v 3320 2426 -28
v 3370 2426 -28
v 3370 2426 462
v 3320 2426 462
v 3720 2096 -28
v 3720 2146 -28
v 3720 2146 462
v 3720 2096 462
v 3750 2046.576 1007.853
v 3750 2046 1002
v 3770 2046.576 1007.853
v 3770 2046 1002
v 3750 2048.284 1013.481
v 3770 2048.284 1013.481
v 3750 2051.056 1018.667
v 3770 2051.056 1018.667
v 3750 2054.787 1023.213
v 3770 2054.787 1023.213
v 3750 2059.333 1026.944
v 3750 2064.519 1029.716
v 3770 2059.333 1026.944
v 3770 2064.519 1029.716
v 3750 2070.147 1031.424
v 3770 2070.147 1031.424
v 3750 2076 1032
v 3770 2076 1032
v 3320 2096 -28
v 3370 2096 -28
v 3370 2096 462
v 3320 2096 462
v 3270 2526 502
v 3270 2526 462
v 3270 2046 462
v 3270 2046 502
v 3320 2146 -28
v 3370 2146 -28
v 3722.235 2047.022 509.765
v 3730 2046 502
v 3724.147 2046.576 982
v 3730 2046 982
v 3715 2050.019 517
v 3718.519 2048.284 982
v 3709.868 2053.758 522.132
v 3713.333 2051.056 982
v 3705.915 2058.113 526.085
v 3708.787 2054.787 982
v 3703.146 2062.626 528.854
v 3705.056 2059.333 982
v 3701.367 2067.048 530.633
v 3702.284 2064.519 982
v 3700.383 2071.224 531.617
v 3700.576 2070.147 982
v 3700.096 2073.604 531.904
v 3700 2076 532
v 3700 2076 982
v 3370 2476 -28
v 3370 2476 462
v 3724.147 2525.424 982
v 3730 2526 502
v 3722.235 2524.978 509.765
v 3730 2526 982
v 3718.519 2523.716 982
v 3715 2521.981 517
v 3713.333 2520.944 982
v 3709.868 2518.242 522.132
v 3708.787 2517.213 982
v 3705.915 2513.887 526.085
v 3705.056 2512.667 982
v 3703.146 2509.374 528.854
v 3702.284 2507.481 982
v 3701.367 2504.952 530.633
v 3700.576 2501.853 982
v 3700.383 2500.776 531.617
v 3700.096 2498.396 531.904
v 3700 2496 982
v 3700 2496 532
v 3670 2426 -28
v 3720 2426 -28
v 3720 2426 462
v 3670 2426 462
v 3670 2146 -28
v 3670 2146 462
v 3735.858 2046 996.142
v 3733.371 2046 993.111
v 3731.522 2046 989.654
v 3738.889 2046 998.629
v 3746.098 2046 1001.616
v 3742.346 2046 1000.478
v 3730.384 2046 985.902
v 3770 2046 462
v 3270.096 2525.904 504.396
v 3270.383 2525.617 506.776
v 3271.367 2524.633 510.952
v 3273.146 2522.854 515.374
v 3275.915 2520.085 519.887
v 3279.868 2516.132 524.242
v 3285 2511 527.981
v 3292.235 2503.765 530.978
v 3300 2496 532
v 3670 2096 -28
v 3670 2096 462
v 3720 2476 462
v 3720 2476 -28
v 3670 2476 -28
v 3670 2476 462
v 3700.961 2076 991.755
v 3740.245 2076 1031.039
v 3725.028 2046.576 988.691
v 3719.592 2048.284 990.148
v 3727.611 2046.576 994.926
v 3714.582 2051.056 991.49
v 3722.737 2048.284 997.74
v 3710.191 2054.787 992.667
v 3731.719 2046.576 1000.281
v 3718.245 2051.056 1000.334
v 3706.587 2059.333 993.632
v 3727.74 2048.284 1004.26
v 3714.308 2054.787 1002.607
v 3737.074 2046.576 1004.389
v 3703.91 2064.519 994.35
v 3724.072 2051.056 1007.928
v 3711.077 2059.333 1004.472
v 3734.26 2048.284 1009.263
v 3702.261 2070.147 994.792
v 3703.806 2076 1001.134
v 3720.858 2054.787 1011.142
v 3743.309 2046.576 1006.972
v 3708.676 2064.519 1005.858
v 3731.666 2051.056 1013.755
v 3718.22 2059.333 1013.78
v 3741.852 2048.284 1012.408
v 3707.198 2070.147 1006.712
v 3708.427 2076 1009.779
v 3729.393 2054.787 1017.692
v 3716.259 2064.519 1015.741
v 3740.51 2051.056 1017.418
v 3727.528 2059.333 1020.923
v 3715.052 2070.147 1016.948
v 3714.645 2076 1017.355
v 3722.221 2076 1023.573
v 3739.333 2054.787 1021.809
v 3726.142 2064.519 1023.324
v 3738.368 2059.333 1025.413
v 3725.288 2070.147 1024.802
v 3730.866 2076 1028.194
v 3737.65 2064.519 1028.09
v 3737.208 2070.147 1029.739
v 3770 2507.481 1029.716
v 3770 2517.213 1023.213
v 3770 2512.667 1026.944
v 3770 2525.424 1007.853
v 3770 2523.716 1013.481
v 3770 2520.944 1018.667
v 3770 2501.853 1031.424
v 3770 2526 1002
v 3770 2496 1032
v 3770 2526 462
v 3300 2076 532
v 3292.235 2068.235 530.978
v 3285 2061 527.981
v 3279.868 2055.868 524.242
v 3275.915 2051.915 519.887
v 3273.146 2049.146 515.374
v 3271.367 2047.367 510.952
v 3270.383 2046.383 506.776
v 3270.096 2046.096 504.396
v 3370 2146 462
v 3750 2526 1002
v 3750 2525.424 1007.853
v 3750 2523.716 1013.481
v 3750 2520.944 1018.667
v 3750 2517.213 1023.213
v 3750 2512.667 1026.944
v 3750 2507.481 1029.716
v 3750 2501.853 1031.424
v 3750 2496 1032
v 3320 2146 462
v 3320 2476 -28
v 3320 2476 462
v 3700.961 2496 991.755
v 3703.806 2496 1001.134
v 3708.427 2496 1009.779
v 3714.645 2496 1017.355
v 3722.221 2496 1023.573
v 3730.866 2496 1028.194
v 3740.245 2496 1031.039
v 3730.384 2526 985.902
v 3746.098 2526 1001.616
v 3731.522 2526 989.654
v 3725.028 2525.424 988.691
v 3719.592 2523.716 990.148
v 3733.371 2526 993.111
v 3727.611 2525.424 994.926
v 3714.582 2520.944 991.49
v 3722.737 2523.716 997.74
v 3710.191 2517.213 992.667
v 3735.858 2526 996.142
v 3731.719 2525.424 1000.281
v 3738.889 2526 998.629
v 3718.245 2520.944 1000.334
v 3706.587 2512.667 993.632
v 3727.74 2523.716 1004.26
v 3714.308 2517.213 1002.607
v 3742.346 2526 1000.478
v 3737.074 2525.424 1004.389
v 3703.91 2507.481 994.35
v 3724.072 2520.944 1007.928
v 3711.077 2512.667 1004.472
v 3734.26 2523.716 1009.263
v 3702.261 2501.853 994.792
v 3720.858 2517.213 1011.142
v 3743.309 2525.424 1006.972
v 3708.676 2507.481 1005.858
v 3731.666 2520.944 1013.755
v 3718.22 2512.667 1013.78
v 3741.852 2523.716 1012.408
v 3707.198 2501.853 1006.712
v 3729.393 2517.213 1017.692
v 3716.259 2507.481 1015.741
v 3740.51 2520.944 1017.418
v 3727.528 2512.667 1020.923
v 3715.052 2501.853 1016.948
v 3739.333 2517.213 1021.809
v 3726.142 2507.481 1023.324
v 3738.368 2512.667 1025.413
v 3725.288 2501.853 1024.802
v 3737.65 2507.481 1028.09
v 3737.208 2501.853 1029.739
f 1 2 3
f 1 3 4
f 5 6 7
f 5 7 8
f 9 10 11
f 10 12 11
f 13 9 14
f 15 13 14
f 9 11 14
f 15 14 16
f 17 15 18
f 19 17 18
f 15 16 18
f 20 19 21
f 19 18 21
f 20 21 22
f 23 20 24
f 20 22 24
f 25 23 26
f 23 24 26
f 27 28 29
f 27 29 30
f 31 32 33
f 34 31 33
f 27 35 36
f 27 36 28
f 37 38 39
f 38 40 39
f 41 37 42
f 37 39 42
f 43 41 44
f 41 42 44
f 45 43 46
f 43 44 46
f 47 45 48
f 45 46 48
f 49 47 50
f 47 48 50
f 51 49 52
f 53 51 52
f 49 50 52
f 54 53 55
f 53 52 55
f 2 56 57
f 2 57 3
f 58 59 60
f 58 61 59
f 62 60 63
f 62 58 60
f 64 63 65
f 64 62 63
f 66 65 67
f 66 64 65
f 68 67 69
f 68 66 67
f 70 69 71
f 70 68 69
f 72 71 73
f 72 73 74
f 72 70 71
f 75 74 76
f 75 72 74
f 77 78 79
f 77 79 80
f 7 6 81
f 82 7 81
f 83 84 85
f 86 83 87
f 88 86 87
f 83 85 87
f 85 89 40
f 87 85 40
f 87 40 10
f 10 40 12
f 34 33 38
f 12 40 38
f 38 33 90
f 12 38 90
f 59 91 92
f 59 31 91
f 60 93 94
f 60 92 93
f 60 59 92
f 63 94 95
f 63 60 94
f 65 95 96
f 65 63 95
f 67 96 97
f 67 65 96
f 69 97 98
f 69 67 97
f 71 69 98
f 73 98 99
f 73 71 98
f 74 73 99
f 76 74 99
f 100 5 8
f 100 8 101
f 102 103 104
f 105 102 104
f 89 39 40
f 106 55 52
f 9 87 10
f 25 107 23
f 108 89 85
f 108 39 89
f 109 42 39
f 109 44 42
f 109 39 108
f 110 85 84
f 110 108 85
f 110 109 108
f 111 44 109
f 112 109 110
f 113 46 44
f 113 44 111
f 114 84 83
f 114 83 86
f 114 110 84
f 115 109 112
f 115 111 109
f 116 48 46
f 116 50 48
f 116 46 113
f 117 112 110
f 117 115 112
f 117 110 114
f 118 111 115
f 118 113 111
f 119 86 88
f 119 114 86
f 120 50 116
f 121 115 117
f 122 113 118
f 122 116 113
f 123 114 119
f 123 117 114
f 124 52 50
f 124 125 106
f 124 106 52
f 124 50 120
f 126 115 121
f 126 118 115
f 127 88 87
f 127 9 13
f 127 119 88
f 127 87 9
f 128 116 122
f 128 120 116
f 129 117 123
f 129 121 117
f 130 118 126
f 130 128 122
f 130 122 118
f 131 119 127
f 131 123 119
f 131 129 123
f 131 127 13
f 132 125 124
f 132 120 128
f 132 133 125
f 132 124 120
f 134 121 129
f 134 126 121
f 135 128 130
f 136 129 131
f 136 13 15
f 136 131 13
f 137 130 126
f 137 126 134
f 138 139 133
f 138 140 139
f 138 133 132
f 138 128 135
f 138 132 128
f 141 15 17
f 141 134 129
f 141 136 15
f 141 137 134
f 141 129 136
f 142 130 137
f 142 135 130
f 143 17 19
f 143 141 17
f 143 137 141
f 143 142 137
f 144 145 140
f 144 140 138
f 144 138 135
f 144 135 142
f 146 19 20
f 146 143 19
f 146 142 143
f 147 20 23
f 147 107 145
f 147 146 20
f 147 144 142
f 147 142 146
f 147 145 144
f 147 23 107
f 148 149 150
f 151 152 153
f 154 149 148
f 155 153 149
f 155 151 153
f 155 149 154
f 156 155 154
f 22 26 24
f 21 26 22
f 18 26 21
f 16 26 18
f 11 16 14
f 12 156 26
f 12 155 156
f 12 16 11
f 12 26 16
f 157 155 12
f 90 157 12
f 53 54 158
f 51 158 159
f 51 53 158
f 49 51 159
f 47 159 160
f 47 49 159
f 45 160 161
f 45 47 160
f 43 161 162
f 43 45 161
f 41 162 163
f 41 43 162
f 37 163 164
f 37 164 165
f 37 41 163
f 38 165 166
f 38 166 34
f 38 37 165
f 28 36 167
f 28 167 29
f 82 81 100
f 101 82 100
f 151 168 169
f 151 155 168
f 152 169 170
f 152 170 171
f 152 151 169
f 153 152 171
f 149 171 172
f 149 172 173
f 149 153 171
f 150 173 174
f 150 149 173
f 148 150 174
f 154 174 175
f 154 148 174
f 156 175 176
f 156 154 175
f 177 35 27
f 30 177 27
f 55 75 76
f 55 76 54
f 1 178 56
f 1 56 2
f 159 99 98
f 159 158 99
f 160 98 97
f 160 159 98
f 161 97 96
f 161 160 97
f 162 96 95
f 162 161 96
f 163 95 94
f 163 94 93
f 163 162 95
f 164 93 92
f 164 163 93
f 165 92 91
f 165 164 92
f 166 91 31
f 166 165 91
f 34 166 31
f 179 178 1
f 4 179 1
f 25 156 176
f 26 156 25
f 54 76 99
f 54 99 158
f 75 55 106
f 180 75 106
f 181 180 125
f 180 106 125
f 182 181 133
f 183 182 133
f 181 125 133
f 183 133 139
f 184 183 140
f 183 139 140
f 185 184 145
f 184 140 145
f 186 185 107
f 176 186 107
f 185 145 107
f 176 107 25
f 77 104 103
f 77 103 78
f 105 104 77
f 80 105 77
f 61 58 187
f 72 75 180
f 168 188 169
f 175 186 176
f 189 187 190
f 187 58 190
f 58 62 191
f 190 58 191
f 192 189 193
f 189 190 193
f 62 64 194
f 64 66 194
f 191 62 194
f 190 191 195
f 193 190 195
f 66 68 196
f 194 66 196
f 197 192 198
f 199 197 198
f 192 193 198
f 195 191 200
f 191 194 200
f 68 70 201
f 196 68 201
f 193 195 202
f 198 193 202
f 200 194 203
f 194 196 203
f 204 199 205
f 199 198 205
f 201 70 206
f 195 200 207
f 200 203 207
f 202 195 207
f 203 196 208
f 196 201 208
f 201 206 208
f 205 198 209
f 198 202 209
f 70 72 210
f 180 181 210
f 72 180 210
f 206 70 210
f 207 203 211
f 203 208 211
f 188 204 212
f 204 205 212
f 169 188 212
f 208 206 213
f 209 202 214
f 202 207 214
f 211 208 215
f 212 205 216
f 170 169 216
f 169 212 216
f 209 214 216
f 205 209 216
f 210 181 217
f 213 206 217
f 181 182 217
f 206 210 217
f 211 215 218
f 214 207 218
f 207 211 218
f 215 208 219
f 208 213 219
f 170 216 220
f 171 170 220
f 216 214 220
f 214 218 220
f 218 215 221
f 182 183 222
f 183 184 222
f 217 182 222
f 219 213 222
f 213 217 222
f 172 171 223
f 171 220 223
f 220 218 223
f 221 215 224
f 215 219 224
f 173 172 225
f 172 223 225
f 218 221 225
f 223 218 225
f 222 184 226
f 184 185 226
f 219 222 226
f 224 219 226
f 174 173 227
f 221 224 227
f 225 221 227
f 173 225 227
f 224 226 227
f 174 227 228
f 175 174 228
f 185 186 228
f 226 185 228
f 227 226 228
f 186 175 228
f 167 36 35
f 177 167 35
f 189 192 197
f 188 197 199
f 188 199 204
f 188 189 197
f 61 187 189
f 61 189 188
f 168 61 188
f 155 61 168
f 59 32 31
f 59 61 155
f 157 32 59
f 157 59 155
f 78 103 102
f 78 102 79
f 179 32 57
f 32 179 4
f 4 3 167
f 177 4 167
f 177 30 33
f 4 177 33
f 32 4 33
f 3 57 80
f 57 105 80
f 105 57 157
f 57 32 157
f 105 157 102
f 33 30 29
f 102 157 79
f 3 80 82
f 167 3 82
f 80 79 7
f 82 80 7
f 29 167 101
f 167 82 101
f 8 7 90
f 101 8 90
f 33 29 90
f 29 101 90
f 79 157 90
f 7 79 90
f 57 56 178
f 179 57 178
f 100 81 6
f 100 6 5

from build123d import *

# Parameters (mm, degrees)
SKETCH619_W             = 480
SKETCH619_H             = 500
PAD295_DEPTH            = 70
SKETCH623_W             = 480
SKETCH623_H             = 70
PAD298_DEPTH            = 500
SKETCH620_W             = 50
SKETCH620_H             = 50
PAD294_DEPTH            = 490
SKETCH622_W             = 50
SKETCH622_H             = 50
PAD293_DEPTH            = 490
SKETCH621_W             = 50
SKETCH621_H             = 50
PAD296_DEPTH            = 490
SKETCH624_W             = 50
SKETCH624_H             = 50
PAD297_DEPTH            = 490
FILLET207_R             = 50
FILLET208_R             = 30
FILLET209_R             = 30
BODY125_PLACEMENT_ANGLE = 90


with BuildPart() as part:
    # Sketch619 → Pad295 (new body)
    with BuildSketch(Plane.XY):
        with Locations((240, 250)):
            Rectangle(SKETCH619_W, SKETCH619_H)
    extrude(amount=PAD295_DEPTH)

    # Sketch623 (on Face6 of Pad295) → Pad298 (join)
    with BuildSketch(Plane.XY.offset(70)):
        with Locations((240, 465)):
            Rectangle(SKETCH623_W, SKETCH623_H)
    extrude(amount=PAD298_DEPTH)

    # Sketch620 (on Face4 of Pad298) → Pad294 (join)
    with BuildSketch(Plane(origin=(0, 0, 0), x_dir=(1, 0, 0), z_dir=(0, 0, -1))):
        with Locations((75, -75)):
            Rectangle(SKETCH620_W, SKETCH620_H)
    extrude(amount=PAD294_DEPTH)

    # Sketch622 (on Face4 of Pad294) → Pad293 (join)
    with BuildSketch(Plane(origin=(0, 0, 0), x_dir=(1, 0, 0), z_dir=(0, 0, -1))):
        with Locations((405, -75)):
            Rectangle(SKETCH622_W, SKETCH622_H)
    extrude(amount=PAD293_DEPTH)

    # Sketch621 (on Face4 of Pad293) → Pad296 (join)
    with BuildSketch(Plane(origin=(0, 0, 0), x_dir=(1, 0, 0), z_dir=(0, 0, -1))):
        with Locations((75, -425)):
            Rectangle(SKETCH621_W, SKETCH621_H)
    extrude(amount=PAD296_DEPTH)

    # Sketch624 (on Face4 of Pad296) → Pad297 (join)
    with BuildSketch(Plane(origin=(0, 0, 0), x_dir=(1, 0, 0), z_dir=(0, 0, -1))):
        with Locations((405, -425)):
            Rectangle(SKETCH624_W, SKETCH624_H)
    extrude(amount=PAD297_DEPTH)

    # Fillet207
    fillet207_edges = [part.edges().sort_by_distance(p)[0] for p in [
        (240, 430, 570),
    ]]
    fillet(fillet207_edges, radius=FILLET207_R)

    # Fillet208
    fillet208_edges = [part.edges().sort_by_distance(p)[0] for p in [
        (240, 0, 70),
        (480, 215, 70),
        (0, 215, 70),
    ]]
    fillet(fillet208_edges, radius=FILLET208_R)

    # Fillet209
    fillet209_edges = [part.edges().sort_by_distance(p)[0] for p in [
        (480, 430, 295),
        (480, 444.644661, 555.355339),
        (0, 430, 295),
        (0, 444.644661, 555.355339),
    ]]
    fillet(fillet209_edges, radius=FILLET209_R)


with BuildPart() as part_1:
    # Body125 placement: moved
    add(part.part.moved(Location((3270, 2526, 462))).rotate(Axis((3270, 2526, 462), (0, 0, -1)), BODY125_PLACEMENT_ANGLE))


solid = part_1.part
